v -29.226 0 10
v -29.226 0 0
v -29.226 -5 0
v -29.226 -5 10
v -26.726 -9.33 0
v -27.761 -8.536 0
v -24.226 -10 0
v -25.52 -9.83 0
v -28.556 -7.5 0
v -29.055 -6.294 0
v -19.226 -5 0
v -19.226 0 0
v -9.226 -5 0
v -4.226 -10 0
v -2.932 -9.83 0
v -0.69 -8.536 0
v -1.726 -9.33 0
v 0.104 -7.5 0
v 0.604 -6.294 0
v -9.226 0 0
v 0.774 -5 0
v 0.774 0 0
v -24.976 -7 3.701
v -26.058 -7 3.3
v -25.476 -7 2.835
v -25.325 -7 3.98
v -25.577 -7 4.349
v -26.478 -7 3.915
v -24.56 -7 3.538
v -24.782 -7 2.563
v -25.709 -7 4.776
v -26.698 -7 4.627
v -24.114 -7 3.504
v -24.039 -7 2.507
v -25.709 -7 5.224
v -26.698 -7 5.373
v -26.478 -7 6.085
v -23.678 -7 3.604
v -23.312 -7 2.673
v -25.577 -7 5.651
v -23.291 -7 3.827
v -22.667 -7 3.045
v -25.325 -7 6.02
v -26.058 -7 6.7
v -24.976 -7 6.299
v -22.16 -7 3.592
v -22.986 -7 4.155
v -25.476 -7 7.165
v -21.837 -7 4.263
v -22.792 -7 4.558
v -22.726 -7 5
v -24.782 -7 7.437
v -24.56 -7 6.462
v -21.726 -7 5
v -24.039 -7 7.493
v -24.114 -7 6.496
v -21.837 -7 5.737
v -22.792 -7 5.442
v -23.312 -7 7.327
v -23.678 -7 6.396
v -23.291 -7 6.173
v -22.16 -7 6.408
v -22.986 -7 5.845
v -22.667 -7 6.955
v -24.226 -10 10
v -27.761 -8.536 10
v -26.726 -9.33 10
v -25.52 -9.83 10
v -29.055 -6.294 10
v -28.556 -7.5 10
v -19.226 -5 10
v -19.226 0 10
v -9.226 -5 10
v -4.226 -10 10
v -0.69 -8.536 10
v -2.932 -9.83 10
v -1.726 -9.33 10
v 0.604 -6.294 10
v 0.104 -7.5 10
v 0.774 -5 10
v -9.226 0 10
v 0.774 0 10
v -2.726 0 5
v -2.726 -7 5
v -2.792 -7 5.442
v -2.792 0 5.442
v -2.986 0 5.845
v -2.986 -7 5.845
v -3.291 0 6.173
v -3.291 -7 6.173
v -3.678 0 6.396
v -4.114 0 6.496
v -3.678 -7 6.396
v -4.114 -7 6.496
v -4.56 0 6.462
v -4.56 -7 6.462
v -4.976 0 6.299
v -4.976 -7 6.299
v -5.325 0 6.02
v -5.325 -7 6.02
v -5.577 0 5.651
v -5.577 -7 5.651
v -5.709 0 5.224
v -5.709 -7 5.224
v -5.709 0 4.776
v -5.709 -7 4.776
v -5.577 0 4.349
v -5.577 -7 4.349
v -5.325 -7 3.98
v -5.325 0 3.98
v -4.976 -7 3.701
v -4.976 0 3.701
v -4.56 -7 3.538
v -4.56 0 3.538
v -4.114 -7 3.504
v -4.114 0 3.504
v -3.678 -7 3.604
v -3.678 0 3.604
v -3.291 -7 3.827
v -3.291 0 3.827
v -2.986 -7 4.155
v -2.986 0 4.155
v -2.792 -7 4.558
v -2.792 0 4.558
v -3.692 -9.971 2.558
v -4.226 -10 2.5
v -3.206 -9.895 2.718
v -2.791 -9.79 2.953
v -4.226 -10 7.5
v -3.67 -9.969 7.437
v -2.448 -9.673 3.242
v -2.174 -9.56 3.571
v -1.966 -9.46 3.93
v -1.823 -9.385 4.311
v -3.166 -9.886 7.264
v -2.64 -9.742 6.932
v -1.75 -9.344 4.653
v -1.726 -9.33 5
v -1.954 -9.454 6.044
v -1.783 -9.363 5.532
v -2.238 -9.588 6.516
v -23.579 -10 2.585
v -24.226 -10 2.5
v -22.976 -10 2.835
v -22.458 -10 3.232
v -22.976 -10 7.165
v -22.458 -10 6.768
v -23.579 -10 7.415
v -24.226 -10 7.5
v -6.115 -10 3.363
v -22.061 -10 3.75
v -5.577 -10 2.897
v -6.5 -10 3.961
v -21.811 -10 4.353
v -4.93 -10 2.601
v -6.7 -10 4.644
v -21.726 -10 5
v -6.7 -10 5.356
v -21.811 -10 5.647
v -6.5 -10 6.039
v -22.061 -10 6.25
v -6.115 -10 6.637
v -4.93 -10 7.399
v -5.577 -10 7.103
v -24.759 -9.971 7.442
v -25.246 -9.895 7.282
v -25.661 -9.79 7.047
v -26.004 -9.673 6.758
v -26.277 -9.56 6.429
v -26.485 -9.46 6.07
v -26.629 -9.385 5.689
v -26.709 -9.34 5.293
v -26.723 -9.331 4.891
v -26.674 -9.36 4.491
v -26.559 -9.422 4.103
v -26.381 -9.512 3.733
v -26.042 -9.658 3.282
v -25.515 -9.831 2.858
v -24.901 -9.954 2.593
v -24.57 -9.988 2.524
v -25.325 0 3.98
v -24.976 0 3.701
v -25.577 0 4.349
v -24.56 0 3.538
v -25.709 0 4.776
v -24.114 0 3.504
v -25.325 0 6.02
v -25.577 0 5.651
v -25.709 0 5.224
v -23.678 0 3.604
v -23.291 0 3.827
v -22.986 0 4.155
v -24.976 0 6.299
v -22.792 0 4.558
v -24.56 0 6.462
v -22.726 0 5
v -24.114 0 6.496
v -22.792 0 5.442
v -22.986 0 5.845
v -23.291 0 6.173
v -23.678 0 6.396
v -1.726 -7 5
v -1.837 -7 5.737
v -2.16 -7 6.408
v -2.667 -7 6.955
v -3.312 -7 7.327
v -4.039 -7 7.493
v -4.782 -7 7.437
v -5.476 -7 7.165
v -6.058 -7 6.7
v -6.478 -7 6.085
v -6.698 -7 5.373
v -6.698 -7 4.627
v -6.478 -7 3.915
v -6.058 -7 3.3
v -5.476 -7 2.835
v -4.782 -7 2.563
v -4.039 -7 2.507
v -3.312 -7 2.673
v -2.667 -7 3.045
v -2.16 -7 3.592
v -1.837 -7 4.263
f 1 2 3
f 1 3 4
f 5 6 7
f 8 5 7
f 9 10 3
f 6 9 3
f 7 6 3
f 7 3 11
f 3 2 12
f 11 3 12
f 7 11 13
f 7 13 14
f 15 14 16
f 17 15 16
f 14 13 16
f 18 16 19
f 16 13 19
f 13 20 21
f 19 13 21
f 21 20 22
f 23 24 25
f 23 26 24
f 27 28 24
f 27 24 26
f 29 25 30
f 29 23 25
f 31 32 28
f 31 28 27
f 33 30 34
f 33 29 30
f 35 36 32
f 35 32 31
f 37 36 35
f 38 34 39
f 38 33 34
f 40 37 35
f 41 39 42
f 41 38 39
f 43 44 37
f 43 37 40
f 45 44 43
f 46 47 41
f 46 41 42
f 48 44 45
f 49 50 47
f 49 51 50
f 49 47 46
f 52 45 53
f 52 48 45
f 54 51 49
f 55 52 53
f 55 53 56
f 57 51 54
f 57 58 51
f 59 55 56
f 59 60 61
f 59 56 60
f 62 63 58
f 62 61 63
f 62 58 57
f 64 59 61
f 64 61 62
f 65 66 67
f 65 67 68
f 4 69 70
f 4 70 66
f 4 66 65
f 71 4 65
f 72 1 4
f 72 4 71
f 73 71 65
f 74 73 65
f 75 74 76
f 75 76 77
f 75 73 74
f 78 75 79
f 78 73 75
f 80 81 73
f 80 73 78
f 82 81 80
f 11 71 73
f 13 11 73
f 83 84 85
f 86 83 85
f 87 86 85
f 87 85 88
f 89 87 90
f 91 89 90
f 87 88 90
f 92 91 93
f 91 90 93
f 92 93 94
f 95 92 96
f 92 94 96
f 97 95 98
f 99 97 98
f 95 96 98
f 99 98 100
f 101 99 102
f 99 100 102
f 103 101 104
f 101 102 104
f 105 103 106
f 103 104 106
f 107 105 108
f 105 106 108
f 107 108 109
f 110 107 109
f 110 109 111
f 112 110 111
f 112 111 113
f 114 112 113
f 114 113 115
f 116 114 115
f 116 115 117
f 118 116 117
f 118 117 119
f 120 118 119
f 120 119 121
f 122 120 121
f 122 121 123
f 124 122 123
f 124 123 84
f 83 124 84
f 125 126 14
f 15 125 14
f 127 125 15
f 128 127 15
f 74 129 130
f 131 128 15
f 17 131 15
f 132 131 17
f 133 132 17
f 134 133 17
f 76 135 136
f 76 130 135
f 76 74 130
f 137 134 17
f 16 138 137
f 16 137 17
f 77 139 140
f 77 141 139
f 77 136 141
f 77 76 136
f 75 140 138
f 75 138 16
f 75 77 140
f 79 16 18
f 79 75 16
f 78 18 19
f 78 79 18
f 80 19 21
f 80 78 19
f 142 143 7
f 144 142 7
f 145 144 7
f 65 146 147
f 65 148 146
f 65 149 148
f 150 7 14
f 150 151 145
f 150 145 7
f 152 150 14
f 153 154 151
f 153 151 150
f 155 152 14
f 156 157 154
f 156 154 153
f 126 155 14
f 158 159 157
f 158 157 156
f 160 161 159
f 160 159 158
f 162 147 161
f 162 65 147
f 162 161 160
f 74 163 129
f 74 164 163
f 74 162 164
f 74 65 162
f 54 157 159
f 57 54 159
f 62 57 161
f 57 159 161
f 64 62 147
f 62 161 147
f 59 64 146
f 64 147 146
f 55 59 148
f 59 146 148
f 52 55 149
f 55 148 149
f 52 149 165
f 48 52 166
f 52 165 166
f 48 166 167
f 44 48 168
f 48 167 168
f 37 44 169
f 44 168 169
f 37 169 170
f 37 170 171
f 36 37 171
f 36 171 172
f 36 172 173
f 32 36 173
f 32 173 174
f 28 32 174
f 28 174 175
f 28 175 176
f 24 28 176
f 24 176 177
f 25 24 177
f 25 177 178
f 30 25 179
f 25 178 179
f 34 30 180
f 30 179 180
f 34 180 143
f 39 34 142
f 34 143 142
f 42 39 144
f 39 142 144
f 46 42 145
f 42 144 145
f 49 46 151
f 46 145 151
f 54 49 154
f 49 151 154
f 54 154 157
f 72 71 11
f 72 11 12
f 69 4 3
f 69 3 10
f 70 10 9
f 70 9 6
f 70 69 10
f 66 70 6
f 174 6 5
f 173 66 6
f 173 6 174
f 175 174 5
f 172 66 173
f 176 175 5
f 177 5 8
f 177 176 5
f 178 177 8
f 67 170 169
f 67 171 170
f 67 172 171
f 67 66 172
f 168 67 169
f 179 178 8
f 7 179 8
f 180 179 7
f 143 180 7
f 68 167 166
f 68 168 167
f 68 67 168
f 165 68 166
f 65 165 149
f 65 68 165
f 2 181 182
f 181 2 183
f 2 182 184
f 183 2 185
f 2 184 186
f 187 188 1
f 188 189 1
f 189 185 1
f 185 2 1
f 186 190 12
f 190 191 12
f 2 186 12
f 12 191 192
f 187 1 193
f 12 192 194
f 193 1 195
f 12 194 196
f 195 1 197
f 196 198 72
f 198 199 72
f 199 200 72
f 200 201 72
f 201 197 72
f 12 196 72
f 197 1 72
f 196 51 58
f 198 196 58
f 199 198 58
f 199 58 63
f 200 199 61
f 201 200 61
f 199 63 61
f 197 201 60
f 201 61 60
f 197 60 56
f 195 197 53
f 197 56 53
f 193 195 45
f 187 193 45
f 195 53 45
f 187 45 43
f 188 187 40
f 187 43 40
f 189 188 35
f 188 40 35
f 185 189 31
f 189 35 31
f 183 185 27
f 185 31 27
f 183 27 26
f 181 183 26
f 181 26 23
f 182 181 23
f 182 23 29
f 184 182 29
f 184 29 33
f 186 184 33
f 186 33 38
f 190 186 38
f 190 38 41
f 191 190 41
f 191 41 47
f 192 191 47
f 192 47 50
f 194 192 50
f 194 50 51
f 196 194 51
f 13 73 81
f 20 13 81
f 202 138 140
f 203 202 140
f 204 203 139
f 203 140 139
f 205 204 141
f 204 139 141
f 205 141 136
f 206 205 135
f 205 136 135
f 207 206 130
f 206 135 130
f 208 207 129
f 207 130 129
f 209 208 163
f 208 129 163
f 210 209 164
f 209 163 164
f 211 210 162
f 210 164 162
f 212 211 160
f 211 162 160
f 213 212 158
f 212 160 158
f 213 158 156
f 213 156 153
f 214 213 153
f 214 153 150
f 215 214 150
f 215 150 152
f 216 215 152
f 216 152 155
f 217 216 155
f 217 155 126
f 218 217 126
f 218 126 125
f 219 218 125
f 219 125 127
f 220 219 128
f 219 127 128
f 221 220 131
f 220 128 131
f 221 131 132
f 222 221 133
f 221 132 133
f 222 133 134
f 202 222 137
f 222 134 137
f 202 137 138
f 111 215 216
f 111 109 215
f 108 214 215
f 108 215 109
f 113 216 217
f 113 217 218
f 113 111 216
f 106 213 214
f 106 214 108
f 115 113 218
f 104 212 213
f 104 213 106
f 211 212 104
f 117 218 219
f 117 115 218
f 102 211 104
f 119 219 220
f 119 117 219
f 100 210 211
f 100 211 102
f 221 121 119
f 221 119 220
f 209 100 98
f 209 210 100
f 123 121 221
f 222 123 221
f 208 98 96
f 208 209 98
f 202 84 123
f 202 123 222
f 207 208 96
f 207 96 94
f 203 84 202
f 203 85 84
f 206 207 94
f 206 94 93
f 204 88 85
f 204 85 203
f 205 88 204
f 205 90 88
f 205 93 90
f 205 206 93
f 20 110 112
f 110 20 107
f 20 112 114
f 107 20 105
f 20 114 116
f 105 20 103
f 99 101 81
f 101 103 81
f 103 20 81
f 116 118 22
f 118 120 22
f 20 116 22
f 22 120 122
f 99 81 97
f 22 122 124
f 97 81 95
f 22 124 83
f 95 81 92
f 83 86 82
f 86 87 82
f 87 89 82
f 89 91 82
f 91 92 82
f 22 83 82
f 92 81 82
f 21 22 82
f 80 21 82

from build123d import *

# Parameters (mm, degrees)
F0_W     = 30
F0_H     = 10
F1_DEPTH = 10
F2_W     = 5
F2_H     = 5
F3_DEPTH = 25
F4_R     = 5
F5_R     = 1.5
F6_DEPTH = 25
F7_R     = 2.5
F8_DEPTH = 3


with BuildPart() as f1:
    # F0 (on Front) → F1 (new body)
    with BuildSketch(Plane.XZ):
        with Locations((-14.225836, 5)):
            Rectangle(F0_W, F0_H)
    extrude(amount=F1_DEPTH)

    # F2 (on face) → F3 (cut)
    with BuildSketch(Plane.XY.offset(10)):
        with Locations((-11.725836, -2.5)):
            Rectangle(F2_W, F2_H)
        with Locations((-16.725836, -2.5)):
            Rectangle(F2_W, F2_H)
    extrude(amount=-F3_DEPTH, mode=Mode.SUBTRACT)

    # F4
    f4_edges = [f1.edges().sort_by_distance(p)[0] for p in [
        (-29.225836, -10, 5),
        (0.774164, -10, 5),
    ]]
    fillet(f4_edges, radius=F4_R)

    # F5 (on face) → F6 (cut)
    with BuildSketch(Plane.XZ.offset(10)):
        with Locations((-24.225836, 5)):
            Circle(F5_R)
        with Locations((-4.225836, 5)):
            Circle(F5_R)
    extrude(amount=-F6_DEPTH, mode=Mode.SUBTRACT)

    # F7 (on face) → F8 (cut)
    with BuildSketch(Plane.XZ.offset(10)):
        with Locations((-24.225836, 5)):
            Circle(F7_R)
        with Locations((-4.225836, 5)):
            Circle(F7_R)
    extrude(amount=-F8_DEPTH, mode=Mode.SUBTRACT)


solid = f1.part
